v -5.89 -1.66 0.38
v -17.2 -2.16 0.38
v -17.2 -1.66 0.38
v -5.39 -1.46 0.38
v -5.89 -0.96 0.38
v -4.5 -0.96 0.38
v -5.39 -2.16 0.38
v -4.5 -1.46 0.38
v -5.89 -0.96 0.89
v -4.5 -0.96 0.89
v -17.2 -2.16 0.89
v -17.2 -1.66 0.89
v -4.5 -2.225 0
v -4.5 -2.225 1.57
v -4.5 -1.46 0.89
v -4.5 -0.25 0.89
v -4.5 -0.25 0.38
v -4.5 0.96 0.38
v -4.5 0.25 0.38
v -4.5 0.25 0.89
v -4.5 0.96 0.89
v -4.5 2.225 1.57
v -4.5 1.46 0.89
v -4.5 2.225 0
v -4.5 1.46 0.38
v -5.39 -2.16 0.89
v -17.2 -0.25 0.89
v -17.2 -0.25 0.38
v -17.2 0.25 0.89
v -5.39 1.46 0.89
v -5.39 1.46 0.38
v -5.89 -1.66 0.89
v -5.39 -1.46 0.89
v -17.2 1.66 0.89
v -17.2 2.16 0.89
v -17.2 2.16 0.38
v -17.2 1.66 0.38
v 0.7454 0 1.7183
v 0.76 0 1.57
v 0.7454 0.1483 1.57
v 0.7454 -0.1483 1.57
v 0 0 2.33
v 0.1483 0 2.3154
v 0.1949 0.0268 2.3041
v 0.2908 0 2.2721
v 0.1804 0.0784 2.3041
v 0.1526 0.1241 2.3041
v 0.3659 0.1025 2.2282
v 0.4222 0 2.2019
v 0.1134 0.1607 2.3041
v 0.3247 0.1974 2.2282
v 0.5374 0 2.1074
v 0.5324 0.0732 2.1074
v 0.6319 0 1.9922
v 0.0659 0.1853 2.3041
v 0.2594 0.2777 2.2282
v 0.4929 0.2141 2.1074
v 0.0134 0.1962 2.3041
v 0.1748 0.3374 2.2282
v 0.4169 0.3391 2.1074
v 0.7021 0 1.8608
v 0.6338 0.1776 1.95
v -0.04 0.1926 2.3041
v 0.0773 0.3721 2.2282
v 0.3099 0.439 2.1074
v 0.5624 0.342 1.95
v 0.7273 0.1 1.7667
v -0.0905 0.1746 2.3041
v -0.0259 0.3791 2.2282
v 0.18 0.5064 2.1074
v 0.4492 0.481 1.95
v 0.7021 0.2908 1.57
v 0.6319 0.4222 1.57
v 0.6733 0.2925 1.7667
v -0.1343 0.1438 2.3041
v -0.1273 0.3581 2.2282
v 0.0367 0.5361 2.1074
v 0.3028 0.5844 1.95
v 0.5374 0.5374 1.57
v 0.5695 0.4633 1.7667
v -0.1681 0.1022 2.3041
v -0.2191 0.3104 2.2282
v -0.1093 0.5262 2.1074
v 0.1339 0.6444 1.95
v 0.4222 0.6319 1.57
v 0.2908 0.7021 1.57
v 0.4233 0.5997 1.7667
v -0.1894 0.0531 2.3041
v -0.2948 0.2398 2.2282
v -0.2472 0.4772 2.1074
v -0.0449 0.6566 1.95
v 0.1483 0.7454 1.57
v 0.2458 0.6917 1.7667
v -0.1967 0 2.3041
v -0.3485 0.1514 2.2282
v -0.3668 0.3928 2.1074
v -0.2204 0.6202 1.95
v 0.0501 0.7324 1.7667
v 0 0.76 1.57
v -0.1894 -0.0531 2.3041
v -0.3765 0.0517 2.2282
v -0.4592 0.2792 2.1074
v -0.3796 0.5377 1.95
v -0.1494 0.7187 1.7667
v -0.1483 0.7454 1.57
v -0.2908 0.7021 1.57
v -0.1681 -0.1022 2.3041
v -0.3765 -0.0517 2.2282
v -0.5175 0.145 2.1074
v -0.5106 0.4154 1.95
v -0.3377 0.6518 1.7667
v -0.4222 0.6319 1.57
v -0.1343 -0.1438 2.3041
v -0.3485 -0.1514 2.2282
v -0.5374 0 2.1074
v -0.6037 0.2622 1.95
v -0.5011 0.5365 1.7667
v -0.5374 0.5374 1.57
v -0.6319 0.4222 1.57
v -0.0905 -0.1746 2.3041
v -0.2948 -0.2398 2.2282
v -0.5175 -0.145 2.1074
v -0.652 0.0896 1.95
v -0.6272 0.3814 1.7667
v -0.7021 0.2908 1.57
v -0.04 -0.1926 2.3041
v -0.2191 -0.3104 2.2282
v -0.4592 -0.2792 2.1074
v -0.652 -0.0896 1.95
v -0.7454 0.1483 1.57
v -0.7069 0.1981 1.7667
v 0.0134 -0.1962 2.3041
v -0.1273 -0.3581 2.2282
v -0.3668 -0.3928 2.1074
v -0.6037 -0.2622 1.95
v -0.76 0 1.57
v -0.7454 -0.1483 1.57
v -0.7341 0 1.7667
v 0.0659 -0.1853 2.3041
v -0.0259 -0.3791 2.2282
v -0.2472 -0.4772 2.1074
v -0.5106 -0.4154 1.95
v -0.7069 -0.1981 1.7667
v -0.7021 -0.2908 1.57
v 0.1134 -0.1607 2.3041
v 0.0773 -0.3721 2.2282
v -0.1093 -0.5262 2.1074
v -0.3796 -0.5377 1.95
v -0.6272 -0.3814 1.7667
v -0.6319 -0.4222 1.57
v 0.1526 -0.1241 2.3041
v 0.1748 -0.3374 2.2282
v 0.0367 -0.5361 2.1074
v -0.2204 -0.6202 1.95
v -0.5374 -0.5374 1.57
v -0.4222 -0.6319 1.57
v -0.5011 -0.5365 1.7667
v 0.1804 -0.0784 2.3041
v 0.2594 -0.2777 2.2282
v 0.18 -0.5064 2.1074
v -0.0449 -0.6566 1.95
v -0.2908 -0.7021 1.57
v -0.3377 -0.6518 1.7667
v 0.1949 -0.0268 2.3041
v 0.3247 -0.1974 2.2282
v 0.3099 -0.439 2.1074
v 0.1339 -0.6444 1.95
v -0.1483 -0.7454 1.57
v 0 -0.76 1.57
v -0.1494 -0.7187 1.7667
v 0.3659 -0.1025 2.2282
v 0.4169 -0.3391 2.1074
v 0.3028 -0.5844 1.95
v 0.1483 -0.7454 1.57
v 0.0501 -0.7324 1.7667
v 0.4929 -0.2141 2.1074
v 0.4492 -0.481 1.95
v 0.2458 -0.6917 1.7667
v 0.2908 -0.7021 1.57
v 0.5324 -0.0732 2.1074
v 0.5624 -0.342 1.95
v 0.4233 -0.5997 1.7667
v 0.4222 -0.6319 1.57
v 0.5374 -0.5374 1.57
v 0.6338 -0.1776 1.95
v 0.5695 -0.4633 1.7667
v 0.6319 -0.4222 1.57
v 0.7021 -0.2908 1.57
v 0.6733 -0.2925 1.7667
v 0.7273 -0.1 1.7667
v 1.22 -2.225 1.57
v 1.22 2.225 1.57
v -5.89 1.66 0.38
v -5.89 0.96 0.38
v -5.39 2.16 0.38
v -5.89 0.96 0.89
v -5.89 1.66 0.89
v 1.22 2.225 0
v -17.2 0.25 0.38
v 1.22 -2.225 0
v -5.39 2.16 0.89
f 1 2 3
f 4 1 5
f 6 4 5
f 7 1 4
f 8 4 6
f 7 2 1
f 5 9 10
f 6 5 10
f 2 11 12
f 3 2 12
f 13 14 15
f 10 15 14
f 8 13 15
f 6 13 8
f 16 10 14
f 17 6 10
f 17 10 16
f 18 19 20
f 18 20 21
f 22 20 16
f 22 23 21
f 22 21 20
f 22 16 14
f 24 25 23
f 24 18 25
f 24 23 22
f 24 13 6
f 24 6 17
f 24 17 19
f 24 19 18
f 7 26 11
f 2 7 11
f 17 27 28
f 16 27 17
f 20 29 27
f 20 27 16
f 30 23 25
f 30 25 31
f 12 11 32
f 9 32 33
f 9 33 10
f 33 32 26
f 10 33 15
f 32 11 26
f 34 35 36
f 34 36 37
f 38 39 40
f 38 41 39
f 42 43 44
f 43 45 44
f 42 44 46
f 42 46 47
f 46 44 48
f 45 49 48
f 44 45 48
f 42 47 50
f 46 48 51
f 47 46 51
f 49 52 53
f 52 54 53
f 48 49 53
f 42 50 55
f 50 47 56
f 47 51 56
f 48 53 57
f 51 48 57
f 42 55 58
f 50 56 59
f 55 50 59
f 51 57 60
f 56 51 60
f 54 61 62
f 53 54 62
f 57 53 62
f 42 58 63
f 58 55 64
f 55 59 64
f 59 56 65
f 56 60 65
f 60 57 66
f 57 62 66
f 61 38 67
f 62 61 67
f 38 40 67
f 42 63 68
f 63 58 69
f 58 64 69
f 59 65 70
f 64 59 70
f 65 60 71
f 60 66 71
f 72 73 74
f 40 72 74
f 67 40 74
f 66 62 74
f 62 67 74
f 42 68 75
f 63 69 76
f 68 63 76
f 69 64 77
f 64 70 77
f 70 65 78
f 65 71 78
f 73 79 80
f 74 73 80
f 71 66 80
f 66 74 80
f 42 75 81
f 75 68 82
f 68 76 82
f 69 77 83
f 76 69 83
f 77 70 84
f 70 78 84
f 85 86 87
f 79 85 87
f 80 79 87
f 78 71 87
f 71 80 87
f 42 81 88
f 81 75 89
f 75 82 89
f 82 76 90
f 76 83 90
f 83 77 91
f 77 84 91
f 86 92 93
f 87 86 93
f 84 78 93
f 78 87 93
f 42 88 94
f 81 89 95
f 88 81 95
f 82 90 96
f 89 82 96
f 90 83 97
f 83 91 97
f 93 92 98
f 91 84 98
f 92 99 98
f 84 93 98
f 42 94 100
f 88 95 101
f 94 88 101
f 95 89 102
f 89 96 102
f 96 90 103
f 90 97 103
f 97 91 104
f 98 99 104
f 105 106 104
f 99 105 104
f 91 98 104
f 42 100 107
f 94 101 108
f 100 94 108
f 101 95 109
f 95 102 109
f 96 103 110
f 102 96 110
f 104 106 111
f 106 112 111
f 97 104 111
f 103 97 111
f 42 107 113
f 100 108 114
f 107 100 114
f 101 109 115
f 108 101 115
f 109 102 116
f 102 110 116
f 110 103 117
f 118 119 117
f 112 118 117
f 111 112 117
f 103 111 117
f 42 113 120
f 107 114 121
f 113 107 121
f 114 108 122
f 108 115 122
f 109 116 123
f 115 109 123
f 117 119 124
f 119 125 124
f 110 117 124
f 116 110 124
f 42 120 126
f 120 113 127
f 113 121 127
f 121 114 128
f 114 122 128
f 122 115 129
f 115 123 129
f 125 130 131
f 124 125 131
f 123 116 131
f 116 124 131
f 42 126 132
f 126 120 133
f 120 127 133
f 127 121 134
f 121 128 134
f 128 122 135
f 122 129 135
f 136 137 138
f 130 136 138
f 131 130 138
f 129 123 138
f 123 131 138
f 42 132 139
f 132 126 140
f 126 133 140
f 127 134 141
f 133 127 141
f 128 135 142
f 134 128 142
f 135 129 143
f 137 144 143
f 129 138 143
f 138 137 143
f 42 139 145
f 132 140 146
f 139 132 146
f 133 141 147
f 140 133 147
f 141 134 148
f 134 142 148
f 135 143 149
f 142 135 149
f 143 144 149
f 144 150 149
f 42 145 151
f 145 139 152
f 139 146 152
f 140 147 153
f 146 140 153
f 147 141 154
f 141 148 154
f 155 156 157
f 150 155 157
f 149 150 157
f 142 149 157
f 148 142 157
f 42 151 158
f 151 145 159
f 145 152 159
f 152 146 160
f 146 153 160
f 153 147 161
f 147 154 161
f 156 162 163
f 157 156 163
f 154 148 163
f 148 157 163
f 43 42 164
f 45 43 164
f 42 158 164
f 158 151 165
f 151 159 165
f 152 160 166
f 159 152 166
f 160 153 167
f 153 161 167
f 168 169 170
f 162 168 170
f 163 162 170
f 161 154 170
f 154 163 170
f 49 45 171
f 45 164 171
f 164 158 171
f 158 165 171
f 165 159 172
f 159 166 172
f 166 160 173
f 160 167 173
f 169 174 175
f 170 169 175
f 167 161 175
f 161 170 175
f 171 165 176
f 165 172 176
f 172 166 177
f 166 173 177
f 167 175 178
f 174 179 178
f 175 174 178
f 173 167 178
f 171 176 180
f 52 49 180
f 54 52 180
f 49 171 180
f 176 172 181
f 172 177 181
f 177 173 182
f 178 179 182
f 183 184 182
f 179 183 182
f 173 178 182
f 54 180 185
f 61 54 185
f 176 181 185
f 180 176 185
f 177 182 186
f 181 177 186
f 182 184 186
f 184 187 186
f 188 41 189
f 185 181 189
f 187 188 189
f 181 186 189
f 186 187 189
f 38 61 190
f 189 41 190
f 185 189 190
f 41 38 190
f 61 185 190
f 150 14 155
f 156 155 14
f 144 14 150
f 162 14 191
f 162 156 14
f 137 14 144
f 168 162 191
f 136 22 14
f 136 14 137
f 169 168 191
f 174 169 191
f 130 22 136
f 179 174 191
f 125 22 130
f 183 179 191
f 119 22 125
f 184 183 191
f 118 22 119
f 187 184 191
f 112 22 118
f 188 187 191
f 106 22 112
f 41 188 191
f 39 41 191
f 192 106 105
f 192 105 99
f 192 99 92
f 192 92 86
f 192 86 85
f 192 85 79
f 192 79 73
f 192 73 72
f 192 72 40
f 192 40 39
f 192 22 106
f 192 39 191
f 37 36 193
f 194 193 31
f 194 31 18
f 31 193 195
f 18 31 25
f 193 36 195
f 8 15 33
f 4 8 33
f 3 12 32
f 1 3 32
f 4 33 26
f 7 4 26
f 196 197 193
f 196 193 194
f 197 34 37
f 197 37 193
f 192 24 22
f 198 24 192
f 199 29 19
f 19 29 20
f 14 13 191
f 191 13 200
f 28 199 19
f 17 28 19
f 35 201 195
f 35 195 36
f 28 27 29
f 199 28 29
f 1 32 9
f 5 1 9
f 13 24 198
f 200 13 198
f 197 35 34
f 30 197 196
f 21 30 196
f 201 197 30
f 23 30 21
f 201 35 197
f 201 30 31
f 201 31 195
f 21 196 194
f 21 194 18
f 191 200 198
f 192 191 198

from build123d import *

# Parameters (mm, degrees)
ESQUISSE1_W        = 5.72
ESQUISSE1_H        = 4.45
BOSS_EXTRU_1_DEPTH = 1.57
BOSS_EXTRU_2_START = -0.68
BOSS_EXTRU_2_DEPTH = 0.51
ESQUISSE4_W        = 12.7
ESQUISSE4_H        = 0.5
BOSS_EXTRU_3_DEPTH = 0.51


with BuildPart() as part:
    # Esquisse1 → Boss.-Extru.1 (new body)
    with BuildSketch(Plane.XY):
        with Locations((-1.64, 0)):
            Rectangle(ESQUISSE1_W, ESQUISSE1_H)
    extrude(amount=BOSS_EXTRU_1_DEPTH)

    # Esquisse2 → Révolution5 (revolve)
    with BuildSketch(Plane(origin=(0, 0, 0), x_dir=(1, 0, 0), z_dir=(0, 1, 0))):
        with BuildLine():
            Line((0, -0.81), (0, -2.33))
            ThreePointArc((0, -2.33), (0.76, -1.57), (0, -0.81))
        make_face()
    revolve(axis=Axis((0, 0, 0), (0, 0, 1)))

    # Esquisse3 → Boss.-Extru.2 (add)
    with BuildSketch(Plane.XY.offset(1.57).offset(BOSS_EXTRU_2_START)):
        Polygon((-4.5, 1.46), (-5.39, 1.46), (-5.39, 2.16), (-17.2, 2.16), (-17.2, 1.66), (-5.89, 1.66), (-5.89, 0.96), (-4.5, 0.96), align=None)
    boss_extru_2 = extrude(amount=-BOSS_EXTRU_2_DEPTH)

    # Symétrie1: Boss.-Extru.2 across plane
    add(boss_extru_2.mirror(Plane.ZX))

    # Esquisse4 → Boss.-Extru.3 (add)
    with BuildSketch(Plane.XY.offset(0.89)):
        with Locations((-10.85, 0)):
            Rectangle(ESQUISSE4_W, ESQUISSE4_H)
    extrude(amount=-BOSS_EXTRU_3_DEPTH)


solid = part.part
